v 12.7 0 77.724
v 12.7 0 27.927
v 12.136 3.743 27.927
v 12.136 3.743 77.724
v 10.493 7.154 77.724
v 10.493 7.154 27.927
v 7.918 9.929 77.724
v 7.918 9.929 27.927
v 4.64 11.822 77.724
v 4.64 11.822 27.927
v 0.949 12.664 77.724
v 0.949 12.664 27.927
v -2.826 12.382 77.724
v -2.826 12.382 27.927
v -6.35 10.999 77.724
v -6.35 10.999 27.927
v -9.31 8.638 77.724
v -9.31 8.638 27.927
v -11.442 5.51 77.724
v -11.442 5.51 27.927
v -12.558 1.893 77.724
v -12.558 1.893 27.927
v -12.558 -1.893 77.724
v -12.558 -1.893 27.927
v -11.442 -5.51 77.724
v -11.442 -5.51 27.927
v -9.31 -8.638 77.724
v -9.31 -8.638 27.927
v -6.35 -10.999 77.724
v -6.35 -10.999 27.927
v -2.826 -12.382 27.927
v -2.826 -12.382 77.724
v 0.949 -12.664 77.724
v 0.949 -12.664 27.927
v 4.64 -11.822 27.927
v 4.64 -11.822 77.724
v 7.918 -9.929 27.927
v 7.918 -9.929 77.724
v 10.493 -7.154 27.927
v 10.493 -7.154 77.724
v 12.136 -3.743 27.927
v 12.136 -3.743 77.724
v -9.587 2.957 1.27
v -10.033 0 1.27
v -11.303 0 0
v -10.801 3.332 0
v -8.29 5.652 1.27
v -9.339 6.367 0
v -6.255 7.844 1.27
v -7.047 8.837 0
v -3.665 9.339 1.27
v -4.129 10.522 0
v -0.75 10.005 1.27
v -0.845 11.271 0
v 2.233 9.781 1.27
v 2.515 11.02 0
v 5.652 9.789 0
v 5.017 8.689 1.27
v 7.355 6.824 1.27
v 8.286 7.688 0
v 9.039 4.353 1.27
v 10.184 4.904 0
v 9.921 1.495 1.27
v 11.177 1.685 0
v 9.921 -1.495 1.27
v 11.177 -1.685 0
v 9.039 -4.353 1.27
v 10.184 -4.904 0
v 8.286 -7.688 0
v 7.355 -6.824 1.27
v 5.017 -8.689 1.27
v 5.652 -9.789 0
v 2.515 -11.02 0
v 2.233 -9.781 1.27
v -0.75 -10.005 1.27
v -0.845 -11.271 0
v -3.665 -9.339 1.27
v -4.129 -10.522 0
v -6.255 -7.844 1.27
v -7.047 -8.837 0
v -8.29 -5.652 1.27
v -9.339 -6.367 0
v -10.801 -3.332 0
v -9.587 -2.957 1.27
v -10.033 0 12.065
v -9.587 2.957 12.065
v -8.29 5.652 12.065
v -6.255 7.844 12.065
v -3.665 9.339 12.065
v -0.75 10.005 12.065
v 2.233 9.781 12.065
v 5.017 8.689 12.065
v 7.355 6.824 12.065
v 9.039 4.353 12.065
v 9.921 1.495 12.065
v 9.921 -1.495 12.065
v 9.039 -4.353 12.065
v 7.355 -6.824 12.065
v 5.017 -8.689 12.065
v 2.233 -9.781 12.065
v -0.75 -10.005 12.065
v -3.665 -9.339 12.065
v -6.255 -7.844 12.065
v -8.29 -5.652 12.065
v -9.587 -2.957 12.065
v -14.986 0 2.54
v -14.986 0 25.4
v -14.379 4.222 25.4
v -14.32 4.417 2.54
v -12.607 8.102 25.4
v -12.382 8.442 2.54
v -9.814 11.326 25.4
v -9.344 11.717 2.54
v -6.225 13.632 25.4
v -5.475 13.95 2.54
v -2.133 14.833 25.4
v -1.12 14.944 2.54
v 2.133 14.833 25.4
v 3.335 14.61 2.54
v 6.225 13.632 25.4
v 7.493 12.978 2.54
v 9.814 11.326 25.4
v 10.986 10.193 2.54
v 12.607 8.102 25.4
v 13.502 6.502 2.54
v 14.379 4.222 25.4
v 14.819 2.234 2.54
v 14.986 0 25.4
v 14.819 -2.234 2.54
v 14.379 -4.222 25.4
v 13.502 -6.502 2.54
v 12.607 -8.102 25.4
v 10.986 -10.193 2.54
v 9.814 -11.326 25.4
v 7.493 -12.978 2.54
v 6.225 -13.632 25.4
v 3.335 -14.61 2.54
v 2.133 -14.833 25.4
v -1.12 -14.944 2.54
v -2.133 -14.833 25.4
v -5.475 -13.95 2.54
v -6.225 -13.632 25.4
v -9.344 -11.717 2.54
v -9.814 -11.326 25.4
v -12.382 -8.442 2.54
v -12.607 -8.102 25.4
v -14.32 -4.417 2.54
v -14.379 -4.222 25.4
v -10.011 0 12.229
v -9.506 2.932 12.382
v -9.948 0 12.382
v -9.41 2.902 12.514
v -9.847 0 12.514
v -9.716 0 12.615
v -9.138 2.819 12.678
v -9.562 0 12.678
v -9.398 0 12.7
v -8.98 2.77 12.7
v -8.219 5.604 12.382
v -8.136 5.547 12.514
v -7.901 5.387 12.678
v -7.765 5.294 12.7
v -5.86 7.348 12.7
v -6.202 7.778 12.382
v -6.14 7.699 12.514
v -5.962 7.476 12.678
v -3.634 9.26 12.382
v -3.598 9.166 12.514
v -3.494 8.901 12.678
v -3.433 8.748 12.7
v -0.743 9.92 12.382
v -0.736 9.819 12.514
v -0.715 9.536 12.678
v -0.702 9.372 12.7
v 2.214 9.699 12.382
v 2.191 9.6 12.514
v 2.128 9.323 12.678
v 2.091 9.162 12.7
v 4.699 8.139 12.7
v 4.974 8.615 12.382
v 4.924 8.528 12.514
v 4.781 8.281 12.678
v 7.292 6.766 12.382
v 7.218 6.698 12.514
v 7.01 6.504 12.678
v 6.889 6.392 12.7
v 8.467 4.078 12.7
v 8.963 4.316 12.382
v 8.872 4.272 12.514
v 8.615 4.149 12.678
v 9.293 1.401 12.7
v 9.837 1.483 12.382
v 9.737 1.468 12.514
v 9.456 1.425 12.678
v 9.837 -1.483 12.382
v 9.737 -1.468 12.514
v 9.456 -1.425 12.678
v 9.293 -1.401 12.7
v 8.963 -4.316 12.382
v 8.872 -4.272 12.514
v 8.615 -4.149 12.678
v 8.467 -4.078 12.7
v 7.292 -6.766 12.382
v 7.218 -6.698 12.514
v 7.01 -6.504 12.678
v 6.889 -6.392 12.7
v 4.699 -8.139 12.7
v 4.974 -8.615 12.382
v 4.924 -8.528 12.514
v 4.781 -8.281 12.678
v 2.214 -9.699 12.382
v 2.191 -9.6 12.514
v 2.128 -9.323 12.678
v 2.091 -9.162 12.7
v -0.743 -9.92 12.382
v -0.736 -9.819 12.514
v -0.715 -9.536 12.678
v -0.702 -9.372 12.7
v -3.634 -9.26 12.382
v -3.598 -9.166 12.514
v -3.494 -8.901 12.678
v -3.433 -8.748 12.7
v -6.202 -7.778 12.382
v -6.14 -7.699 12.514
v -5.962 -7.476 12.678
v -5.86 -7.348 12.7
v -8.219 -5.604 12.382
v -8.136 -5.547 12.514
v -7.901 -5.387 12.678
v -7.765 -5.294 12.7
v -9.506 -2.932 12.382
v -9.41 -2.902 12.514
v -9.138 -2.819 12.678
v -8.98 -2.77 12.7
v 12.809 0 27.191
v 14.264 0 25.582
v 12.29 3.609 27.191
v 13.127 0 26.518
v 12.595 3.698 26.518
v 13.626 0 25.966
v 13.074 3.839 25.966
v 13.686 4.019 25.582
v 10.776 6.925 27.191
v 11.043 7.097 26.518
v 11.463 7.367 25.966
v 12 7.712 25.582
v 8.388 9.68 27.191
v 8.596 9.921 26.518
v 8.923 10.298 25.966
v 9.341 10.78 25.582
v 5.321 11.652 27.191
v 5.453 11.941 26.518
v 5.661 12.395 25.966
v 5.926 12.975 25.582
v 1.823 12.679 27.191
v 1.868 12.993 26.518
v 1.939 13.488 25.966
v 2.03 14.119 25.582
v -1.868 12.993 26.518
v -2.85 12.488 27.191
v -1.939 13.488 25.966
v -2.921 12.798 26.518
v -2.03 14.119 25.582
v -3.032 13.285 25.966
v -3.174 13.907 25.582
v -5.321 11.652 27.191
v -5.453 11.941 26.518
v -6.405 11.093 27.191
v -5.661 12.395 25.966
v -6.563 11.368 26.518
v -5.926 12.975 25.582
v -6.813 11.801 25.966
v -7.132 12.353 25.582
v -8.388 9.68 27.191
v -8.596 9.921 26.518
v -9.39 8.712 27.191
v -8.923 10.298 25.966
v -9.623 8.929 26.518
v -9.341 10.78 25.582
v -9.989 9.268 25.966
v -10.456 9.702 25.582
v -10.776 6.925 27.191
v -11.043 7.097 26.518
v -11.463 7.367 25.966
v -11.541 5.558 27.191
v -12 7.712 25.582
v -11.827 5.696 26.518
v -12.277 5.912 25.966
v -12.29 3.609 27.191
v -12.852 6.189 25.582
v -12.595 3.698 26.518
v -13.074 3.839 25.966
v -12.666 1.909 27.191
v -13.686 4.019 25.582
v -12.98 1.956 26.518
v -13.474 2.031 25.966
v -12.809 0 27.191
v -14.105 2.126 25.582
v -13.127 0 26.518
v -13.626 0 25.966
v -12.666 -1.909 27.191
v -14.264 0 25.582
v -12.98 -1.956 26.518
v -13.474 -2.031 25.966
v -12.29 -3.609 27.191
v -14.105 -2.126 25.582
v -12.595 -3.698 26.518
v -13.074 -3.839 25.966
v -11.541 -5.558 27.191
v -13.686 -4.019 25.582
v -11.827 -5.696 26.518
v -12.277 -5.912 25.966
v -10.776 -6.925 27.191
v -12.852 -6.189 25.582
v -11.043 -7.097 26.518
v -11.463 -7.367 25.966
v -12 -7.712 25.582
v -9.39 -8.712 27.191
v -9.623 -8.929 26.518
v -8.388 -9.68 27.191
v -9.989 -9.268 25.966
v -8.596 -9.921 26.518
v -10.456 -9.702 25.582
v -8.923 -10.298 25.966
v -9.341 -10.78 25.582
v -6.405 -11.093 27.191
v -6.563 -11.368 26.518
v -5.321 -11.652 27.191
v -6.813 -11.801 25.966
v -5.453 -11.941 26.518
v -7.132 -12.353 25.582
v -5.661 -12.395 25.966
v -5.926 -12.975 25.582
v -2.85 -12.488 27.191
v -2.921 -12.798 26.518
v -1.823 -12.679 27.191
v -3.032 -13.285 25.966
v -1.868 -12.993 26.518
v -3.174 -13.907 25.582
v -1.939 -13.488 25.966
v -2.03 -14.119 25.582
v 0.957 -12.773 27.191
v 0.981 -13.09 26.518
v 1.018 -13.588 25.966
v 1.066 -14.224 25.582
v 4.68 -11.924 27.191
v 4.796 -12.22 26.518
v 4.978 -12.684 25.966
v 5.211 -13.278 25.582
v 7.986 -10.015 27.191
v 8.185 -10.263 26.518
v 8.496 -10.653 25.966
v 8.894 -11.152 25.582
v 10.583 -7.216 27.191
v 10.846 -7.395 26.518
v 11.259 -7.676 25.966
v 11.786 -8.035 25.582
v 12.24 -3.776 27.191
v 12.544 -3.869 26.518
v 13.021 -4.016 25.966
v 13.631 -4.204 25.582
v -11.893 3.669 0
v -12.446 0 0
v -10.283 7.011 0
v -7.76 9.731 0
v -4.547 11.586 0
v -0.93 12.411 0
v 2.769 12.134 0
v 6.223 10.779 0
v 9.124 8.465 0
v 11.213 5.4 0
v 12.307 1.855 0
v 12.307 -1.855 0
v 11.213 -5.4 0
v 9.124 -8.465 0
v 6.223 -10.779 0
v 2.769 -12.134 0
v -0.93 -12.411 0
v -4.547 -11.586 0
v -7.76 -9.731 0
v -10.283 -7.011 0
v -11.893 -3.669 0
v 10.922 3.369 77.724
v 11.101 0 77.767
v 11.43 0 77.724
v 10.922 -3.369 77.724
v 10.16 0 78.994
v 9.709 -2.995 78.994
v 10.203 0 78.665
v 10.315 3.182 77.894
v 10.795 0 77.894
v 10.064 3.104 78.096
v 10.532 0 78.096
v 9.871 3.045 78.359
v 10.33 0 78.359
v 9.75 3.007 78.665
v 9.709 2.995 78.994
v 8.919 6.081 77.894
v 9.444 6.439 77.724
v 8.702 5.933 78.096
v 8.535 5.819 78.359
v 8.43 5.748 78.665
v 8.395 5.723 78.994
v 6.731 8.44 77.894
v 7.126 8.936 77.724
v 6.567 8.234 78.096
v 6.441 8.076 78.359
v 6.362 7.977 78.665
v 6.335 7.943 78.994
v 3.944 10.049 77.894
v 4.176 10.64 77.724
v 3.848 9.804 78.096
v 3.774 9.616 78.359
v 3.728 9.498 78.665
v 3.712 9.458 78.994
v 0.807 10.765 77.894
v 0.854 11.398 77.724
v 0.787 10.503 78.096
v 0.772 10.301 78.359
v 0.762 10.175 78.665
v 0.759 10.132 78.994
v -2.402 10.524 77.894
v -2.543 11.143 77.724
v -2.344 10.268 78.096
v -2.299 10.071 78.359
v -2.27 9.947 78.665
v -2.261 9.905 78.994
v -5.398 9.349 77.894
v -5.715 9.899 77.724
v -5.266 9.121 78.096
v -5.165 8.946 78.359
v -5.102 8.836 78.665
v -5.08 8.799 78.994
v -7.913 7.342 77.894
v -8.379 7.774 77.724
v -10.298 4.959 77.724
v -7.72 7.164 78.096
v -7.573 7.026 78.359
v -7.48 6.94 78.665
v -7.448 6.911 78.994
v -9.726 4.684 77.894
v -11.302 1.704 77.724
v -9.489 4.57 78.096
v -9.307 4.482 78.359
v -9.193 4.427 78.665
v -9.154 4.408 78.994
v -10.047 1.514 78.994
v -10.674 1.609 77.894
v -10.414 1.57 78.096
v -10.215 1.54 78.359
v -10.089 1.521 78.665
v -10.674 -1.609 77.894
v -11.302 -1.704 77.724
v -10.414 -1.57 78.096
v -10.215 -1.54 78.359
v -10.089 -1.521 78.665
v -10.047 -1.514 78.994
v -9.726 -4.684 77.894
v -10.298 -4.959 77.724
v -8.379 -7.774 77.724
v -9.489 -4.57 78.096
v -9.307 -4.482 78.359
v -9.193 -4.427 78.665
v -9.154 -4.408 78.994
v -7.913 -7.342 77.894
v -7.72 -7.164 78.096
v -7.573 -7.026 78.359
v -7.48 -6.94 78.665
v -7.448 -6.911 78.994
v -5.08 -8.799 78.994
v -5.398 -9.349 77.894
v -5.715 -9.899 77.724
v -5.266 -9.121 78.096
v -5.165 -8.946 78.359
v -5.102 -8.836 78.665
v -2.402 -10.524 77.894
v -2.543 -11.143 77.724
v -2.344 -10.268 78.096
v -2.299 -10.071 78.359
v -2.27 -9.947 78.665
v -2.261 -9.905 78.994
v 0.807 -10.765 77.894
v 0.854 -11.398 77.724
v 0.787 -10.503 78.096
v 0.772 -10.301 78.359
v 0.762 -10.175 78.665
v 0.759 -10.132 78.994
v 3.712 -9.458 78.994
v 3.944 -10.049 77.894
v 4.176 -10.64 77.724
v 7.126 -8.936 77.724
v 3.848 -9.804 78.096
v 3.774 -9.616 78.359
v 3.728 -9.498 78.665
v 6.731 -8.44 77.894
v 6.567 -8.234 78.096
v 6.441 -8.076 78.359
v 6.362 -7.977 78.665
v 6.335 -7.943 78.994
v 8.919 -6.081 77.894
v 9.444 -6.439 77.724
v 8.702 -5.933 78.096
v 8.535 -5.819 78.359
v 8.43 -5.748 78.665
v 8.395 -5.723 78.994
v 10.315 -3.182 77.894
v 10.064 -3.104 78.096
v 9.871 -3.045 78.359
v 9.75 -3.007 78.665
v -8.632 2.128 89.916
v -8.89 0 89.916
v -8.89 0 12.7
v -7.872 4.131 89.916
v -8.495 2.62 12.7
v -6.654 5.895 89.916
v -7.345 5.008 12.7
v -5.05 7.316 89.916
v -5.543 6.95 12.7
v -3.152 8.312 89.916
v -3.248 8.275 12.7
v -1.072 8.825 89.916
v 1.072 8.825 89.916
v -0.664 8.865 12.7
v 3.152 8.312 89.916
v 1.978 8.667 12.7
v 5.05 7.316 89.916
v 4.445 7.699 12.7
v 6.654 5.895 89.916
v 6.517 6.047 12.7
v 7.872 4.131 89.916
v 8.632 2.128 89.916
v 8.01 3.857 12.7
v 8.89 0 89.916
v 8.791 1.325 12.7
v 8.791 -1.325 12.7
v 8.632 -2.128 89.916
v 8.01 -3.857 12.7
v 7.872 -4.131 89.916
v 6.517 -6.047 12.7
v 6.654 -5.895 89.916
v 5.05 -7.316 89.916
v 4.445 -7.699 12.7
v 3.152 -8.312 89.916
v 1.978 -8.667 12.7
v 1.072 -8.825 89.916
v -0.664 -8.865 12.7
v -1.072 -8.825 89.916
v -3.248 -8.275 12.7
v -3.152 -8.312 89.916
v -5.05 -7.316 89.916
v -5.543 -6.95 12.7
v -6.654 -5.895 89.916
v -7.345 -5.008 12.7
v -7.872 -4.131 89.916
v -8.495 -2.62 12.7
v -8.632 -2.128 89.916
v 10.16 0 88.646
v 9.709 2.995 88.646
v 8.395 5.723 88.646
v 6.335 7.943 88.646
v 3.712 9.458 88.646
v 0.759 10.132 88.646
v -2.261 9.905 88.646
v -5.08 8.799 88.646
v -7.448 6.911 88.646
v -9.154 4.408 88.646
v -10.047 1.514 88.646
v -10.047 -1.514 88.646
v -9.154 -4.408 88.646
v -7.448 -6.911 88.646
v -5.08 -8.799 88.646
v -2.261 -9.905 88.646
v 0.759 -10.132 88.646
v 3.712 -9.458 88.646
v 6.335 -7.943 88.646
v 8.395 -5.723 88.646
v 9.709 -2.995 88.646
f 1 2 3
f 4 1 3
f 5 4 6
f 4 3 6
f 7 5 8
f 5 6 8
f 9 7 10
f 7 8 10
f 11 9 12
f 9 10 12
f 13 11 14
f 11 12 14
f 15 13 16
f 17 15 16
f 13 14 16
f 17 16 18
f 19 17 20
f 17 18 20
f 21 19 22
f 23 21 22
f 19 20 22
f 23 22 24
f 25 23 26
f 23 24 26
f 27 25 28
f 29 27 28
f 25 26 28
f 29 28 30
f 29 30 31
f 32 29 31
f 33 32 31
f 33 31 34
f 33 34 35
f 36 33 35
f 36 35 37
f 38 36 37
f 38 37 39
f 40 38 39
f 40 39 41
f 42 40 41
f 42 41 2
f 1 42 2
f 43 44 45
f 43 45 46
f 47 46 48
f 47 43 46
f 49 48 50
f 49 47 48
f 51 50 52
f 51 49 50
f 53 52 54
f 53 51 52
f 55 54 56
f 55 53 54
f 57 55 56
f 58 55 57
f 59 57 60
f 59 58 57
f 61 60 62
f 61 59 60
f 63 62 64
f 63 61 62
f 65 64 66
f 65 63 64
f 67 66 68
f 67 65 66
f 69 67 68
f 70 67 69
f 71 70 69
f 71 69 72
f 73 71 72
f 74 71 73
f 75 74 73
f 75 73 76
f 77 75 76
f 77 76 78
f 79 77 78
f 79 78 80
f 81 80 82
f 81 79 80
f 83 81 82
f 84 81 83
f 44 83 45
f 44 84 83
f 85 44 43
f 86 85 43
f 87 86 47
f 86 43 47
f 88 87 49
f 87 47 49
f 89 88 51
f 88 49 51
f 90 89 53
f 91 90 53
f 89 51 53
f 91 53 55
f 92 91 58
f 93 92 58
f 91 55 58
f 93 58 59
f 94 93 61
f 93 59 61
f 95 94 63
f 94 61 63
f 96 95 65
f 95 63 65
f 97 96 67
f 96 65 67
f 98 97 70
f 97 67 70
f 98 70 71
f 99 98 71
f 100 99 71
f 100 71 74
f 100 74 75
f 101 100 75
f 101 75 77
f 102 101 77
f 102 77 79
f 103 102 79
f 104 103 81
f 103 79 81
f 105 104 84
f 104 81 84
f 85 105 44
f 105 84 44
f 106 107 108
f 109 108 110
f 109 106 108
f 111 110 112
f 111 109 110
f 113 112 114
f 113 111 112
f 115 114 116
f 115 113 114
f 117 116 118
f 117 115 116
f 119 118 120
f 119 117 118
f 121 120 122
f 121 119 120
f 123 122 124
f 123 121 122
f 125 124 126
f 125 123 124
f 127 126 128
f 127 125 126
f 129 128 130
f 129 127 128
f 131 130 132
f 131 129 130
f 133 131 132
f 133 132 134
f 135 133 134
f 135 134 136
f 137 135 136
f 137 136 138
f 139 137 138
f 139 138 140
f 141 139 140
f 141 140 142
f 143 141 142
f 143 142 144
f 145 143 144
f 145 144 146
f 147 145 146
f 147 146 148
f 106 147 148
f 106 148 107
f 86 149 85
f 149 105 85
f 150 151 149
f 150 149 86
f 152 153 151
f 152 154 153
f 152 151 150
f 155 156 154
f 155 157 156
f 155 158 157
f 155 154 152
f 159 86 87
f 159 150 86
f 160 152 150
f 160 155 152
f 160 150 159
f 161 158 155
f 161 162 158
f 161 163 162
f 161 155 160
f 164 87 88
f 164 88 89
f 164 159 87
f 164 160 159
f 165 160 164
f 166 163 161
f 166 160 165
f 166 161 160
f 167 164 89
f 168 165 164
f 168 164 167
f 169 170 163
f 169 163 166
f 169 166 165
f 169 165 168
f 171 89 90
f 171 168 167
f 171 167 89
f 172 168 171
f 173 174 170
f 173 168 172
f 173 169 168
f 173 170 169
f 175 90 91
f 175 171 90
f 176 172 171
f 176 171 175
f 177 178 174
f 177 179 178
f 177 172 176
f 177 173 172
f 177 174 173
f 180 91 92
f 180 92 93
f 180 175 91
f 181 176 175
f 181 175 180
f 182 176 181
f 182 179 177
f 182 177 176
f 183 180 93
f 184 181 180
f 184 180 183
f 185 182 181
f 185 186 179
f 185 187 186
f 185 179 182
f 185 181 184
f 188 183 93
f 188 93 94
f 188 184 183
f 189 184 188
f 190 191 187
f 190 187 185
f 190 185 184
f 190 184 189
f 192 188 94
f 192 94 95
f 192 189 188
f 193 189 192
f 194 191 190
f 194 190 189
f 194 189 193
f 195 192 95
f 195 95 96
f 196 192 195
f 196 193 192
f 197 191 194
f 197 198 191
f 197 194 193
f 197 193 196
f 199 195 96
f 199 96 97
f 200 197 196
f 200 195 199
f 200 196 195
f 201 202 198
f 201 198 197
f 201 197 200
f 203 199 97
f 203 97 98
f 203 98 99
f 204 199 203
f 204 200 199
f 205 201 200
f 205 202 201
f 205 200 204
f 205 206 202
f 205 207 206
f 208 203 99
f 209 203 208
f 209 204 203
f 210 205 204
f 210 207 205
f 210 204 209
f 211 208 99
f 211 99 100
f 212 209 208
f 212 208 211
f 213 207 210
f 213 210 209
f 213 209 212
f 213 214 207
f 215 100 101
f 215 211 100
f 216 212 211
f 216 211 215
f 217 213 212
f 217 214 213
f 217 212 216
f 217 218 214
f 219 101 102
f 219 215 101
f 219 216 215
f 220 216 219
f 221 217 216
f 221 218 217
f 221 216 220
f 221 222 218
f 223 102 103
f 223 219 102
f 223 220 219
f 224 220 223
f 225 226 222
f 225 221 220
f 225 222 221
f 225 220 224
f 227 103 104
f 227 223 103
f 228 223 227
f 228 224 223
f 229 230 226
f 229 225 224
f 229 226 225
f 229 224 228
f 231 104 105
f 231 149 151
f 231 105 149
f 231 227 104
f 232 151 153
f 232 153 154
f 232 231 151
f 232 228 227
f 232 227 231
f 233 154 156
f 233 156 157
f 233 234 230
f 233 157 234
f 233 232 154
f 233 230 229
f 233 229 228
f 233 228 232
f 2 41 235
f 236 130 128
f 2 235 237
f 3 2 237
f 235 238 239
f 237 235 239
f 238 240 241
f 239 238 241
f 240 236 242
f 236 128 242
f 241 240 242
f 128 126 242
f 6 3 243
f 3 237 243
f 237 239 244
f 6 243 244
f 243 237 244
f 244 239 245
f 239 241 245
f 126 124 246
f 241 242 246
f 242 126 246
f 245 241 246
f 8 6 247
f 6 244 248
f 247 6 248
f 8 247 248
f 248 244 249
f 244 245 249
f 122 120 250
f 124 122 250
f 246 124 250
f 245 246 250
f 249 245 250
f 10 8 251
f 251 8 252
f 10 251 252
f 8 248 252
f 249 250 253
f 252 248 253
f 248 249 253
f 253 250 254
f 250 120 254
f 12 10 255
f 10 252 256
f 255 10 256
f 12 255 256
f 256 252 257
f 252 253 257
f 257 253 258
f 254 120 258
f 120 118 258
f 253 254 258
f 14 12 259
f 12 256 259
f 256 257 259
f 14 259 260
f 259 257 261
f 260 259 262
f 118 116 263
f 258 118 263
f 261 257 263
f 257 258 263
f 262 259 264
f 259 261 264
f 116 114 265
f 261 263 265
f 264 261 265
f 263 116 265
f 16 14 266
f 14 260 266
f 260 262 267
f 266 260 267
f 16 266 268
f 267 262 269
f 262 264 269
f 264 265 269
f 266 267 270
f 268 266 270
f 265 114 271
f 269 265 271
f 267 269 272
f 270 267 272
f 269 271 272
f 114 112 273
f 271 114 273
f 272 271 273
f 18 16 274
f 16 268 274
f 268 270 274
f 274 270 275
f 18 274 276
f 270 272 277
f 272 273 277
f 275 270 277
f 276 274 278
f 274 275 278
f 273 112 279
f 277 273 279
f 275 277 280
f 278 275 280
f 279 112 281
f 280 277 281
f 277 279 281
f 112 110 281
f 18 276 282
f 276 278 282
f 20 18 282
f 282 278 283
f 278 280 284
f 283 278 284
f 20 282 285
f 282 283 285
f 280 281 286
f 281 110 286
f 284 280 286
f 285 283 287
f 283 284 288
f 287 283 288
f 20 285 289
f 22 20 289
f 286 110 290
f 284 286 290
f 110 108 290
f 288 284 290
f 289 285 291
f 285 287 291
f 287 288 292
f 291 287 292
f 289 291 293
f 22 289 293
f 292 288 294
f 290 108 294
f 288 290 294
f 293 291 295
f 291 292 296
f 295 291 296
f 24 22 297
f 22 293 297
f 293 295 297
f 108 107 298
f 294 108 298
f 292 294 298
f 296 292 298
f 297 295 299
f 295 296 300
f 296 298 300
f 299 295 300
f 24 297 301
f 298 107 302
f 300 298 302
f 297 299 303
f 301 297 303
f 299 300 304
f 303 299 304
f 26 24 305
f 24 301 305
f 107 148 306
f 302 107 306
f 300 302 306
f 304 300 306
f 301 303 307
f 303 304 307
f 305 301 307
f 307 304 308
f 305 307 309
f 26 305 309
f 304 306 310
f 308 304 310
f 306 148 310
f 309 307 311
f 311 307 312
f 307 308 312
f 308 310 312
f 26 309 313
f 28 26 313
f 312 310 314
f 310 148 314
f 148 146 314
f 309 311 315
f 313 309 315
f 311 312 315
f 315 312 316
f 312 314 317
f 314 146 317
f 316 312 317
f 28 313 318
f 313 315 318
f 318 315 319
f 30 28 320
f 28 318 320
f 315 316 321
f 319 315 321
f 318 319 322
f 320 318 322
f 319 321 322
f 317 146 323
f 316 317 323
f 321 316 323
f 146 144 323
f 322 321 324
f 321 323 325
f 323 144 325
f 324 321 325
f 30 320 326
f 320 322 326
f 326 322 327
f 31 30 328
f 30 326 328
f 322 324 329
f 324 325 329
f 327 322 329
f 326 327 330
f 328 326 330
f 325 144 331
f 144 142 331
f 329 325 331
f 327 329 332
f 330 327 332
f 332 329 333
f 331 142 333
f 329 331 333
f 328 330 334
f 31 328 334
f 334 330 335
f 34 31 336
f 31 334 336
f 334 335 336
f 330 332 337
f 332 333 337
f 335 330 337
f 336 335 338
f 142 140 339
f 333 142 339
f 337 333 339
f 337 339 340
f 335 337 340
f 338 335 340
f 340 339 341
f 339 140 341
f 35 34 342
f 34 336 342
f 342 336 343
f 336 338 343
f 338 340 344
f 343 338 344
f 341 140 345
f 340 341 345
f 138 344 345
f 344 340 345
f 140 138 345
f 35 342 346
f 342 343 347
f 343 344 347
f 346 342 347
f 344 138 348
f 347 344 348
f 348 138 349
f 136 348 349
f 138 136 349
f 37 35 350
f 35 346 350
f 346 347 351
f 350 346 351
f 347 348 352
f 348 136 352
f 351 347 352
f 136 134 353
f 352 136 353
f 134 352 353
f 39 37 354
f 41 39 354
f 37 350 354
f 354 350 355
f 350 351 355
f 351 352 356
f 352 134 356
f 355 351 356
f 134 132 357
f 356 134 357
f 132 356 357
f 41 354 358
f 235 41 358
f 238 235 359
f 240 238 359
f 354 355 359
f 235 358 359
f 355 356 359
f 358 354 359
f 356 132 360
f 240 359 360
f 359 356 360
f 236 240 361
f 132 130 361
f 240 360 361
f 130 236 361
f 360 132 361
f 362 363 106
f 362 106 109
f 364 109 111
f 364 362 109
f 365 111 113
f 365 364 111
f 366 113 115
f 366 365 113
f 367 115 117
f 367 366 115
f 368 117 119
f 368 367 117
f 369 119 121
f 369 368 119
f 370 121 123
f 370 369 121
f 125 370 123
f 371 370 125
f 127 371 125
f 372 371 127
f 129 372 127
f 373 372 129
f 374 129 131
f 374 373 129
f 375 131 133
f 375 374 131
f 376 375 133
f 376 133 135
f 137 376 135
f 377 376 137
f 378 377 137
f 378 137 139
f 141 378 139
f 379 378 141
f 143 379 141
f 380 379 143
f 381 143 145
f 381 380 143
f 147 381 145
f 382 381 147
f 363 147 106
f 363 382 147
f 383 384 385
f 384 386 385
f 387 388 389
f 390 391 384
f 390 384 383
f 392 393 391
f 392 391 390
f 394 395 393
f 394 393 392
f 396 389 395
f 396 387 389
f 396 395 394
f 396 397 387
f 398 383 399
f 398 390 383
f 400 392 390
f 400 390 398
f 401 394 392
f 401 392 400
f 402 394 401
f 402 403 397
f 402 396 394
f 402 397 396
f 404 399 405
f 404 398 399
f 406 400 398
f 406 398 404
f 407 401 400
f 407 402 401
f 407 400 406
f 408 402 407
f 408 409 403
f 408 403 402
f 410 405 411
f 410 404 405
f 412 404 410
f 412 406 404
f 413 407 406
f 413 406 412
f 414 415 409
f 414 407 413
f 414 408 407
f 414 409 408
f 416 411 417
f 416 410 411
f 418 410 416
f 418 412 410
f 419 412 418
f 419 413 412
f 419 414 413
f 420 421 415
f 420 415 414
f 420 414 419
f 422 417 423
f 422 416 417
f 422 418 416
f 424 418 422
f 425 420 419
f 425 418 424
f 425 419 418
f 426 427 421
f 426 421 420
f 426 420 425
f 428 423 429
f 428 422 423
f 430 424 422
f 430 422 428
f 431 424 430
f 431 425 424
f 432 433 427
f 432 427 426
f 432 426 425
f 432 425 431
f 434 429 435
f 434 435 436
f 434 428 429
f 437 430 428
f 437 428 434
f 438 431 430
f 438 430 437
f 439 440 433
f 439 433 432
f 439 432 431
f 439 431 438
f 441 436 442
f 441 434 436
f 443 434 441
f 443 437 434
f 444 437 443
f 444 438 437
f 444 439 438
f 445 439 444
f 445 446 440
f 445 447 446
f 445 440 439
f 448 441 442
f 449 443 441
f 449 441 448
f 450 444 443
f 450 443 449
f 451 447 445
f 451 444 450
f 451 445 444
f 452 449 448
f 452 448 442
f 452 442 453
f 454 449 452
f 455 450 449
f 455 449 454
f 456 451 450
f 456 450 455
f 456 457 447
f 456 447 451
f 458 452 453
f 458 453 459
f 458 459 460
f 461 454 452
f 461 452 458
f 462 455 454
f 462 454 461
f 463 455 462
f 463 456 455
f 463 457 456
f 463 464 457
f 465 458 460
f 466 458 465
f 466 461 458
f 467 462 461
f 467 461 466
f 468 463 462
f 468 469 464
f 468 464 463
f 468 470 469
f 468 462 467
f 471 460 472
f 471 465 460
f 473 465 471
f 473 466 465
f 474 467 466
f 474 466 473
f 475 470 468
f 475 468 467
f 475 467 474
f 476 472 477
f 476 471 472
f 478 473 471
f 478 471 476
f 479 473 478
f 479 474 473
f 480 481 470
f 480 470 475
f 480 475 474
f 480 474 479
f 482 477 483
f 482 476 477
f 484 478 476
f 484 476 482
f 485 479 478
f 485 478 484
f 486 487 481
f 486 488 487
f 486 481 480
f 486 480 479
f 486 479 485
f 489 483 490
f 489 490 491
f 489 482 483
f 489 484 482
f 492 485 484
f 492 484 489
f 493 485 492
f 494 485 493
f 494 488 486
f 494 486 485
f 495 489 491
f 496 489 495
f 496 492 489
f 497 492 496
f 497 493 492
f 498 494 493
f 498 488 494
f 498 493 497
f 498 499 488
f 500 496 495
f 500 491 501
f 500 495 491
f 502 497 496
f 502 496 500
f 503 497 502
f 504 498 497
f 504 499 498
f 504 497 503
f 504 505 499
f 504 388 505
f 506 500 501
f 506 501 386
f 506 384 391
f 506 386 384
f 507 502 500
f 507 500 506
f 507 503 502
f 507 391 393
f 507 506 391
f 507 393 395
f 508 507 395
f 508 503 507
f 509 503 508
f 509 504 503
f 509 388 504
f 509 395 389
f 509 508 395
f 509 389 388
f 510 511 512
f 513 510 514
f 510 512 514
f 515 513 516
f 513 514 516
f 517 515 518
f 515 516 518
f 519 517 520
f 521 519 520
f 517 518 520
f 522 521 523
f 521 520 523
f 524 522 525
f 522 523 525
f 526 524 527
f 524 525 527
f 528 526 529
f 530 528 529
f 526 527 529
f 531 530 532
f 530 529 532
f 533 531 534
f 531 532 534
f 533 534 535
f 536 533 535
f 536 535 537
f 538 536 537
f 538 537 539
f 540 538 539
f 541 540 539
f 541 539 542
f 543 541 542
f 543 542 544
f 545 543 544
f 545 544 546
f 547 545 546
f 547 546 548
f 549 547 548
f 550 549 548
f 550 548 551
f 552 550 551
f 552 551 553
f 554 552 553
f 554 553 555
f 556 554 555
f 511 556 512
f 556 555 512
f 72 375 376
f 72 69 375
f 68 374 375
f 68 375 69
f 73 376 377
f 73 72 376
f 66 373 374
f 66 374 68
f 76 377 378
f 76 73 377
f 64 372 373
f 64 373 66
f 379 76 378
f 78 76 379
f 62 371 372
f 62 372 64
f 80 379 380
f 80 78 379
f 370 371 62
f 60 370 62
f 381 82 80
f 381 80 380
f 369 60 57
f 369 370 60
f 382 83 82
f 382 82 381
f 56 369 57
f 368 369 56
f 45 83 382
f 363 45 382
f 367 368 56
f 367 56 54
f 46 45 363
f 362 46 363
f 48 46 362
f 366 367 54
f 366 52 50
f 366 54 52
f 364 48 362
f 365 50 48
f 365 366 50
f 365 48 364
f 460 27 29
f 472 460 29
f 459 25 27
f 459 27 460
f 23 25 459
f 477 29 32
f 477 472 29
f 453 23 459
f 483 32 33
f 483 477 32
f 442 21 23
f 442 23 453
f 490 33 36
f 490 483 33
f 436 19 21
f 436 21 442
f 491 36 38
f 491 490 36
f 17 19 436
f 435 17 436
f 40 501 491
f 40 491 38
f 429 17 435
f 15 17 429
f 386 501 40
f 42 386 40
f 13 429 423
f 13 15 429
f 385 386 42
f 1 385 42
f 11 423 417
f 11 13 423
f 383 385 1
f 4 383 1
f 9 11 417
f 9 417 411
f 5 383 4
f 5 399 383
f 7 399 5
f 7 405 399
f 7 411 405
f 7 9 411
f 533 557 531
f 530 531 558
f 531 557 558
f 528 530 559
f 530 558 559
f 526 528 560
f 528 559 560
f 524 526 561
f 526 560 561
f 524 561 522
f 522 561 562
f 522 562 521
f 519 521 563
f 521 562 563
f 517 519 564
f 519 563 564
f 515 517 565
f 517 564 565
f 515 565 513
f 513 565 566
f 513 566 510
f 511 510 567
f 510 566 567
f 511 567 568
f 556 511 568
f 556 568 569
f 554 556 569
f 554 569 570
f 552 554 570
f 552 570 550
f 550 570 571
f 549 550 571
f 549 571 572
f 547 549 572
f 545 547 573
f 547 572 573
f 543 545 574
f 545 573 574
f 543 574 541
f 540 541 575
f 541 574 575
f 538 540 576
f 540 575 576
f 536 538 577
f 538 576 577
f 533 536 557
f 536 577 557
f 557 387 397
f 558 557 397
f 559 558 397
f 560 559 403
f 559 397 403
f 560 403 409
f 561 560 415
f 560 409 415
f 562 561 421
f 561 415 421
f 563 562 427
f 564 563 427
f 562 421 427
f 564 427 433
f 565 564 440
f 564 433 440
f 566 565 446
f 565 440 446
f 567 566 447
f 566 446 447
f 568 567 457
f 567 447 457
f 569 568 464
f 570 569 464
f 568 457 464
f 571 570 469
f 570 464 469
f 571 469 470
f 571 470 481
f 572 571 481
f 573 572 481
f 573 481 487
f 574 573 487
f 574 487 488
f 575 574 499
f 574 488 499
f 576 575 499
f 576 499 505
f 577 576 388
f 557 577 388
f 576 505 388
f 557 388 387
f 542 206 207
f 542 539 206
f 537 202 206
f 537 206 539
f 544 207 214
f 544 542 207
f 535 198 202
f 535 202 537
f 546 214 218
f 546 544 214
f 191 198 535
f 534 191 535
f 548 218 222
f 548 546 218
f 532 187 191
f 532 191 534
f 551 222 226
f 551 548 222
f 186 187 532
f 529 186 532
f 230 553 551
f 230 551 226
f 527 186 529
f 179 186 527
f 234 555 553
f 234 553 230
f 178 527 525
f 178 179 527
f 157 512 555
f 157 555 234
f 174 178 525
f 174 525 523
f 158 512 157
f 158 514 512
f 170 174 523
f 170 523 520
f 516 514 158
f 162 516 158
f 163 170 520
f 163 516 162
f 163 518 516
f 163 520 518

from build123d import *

# Parameters (mm, degrees)
SKETCH1_R           = 12.7
BOSS_EXTRUDE1_DEPTH = 89.916
SKETCH2_R           = 8.89
CUT_EXTRUDE1_DEPTH  = 92.69224098
SKETCH3_R           = 10.033
CUT_EXTRUDE2_DEPTH  = 12.7
CUT_EXTRUDE3_START  = -12.192
SKETCH4_R           = 12.7
SKETCH4_R_2         = 10.16
CUT_EXTRUDE3_DEPTH  = 12.192
FILLET1_R           = 1.27
CHAMFER1_SIZE       = 1.27
FILLET2_R           = 0.635
CHAMFER2_SIZE       = 1.27
SKETCH5_R           = 14.986
SKETCH5_R_2         = 12.7
BOSS_EXTRUDE2_DEPTH = 25.4
FILLET3_R           = 2.54
CHAMFER3_SIZE       = 2.54


# Some blends are built 0.0001 mm under size
with BuildPart() as part:
    # Sketch1 → Boss-Extrude1 (new body)
    with BuildSketch(Plane.XY):
        Circle(SKETCH1_R)
    extrude(amount=BOSS_EXTRUDE1_DEPTH)

    # Sketch2 → Cut-Extrude1 (cut, through all)
    with BuildSketch(Plane(origin=(0, 0, 0), x_dir=(-1, 0, 0), z_dir=(0, 0, -1))):
        Circle(SKETCH2_R)
    extrude(amount=-CUT_EXTRUDE1_DEPTH, mode=Mode.SUBTRACT)

    # Sketch3 → Cut-Extrude2 (cut)
    with BuildSketch(Plane(origin=(0, 0, 0), x_dir=(-1, 0, 0), z_dir=(0, 0, -1))):
        Circle(SKETCH3_R)
    extrude(amount=-CUT_EXTRUDE2_DEPTH, mode=Mode.SUBTRACT)

    # Sketch4 → Cut-Extrude3 (cut)
    with BuildSketch(Plane.XY.offset(89.916).offset(CUT_EXTRUDE3_START)):
        Circle(SKETCH4_R)
        Circle(SKETCH4_R_2, mode=Mode.SUBTRACT)
    extrude(amount=CUT_EXTRUDE3_DEPTH, mode=Mode.SUBTRACT)

    # Fillet1
    fillet1_edges = [part.edges().sort_by_distance(p)[0] for p in [
        (-10.16, 0, 77.724),
    ]]
    fillet(fillet1_edges, radius=FILLET1_R)

    # Chamfer1
    chamfer1_edges = [part.edges().sort_by_distance(p)[0] for p in [
        (10.033, 0, 0),
    ]]
    chamfer(chamfer1_edges, length=CHAMFER1_SIZE)

    # Fillet2
    fillet2_edges = [part.edges().sort_by_distance(p)[0] for p in [
        (10.033, 0, 12.7),
    ]]
    fillet(fillet2_edges, radius=FILLET2_R)

    # Chamfer2
    chamfer2_edges = [part.edges().sort_by_distance(p)[0] for p in [
        (-10.16, 0, 89.916),
    ]]
    chamfer(chamfer2_edges, length=CHAMFER2_SIZE - 0.0001)  # a hair under: the kernel refuses the full size

    # Sketch5 → Boss-Extrude2 (add)
    with BuildSketch(Plane(origin=(0, 0, 0), x_dir=(-1, 0, 0), z_dir=(0, 0, -1))):
        Circle(SKETCH5_R)
        Circle(SKETCH5_R_2, mode=Mode.SUBTRACT)
    extrude(amount=-BOSS_EXTRUDE2_DEPTH)

    # Fillet3
    # the kernel refuses this fillet: 2.54 mm, written as the material it adds along each edge
    with BuildSketch(Plane(origin=(0, 0, 25.4), x_dir=(1, 0, 0), z_dir=(0, -1, 0))) as fillet3_piece_1:
        with BuildLine():
            CenterArc((15.24, 2.52726809), FILLET3_R, 180, 84.260829523)
            Line((12.7, 2.52726809), (12.6492, 2.52726809))
            Line((12.6492, 2.52726809), (12.6492, 0))
            Line((12.6492, 0), (12.7, -0.0508))
            ThreePointArc((12.7, -0.0508), (13.843, -0.0508), (14.98092, -0.050545362))
            Line((14.98092, -0.050545362), (14.986, 0))
        make_face()
    revolve(axis=Axis((0, 0, 25.4), (0, 0, 1)))

    # Chamfer3
    chamfer3_edges = [part.edges().sort_by_distance(p)[0] for p in [
        (14.986, 0, 0),
    ]]
    chamfer(chamfer3_edges, length=CHAMFER3_SIZE)


solid = part.part
